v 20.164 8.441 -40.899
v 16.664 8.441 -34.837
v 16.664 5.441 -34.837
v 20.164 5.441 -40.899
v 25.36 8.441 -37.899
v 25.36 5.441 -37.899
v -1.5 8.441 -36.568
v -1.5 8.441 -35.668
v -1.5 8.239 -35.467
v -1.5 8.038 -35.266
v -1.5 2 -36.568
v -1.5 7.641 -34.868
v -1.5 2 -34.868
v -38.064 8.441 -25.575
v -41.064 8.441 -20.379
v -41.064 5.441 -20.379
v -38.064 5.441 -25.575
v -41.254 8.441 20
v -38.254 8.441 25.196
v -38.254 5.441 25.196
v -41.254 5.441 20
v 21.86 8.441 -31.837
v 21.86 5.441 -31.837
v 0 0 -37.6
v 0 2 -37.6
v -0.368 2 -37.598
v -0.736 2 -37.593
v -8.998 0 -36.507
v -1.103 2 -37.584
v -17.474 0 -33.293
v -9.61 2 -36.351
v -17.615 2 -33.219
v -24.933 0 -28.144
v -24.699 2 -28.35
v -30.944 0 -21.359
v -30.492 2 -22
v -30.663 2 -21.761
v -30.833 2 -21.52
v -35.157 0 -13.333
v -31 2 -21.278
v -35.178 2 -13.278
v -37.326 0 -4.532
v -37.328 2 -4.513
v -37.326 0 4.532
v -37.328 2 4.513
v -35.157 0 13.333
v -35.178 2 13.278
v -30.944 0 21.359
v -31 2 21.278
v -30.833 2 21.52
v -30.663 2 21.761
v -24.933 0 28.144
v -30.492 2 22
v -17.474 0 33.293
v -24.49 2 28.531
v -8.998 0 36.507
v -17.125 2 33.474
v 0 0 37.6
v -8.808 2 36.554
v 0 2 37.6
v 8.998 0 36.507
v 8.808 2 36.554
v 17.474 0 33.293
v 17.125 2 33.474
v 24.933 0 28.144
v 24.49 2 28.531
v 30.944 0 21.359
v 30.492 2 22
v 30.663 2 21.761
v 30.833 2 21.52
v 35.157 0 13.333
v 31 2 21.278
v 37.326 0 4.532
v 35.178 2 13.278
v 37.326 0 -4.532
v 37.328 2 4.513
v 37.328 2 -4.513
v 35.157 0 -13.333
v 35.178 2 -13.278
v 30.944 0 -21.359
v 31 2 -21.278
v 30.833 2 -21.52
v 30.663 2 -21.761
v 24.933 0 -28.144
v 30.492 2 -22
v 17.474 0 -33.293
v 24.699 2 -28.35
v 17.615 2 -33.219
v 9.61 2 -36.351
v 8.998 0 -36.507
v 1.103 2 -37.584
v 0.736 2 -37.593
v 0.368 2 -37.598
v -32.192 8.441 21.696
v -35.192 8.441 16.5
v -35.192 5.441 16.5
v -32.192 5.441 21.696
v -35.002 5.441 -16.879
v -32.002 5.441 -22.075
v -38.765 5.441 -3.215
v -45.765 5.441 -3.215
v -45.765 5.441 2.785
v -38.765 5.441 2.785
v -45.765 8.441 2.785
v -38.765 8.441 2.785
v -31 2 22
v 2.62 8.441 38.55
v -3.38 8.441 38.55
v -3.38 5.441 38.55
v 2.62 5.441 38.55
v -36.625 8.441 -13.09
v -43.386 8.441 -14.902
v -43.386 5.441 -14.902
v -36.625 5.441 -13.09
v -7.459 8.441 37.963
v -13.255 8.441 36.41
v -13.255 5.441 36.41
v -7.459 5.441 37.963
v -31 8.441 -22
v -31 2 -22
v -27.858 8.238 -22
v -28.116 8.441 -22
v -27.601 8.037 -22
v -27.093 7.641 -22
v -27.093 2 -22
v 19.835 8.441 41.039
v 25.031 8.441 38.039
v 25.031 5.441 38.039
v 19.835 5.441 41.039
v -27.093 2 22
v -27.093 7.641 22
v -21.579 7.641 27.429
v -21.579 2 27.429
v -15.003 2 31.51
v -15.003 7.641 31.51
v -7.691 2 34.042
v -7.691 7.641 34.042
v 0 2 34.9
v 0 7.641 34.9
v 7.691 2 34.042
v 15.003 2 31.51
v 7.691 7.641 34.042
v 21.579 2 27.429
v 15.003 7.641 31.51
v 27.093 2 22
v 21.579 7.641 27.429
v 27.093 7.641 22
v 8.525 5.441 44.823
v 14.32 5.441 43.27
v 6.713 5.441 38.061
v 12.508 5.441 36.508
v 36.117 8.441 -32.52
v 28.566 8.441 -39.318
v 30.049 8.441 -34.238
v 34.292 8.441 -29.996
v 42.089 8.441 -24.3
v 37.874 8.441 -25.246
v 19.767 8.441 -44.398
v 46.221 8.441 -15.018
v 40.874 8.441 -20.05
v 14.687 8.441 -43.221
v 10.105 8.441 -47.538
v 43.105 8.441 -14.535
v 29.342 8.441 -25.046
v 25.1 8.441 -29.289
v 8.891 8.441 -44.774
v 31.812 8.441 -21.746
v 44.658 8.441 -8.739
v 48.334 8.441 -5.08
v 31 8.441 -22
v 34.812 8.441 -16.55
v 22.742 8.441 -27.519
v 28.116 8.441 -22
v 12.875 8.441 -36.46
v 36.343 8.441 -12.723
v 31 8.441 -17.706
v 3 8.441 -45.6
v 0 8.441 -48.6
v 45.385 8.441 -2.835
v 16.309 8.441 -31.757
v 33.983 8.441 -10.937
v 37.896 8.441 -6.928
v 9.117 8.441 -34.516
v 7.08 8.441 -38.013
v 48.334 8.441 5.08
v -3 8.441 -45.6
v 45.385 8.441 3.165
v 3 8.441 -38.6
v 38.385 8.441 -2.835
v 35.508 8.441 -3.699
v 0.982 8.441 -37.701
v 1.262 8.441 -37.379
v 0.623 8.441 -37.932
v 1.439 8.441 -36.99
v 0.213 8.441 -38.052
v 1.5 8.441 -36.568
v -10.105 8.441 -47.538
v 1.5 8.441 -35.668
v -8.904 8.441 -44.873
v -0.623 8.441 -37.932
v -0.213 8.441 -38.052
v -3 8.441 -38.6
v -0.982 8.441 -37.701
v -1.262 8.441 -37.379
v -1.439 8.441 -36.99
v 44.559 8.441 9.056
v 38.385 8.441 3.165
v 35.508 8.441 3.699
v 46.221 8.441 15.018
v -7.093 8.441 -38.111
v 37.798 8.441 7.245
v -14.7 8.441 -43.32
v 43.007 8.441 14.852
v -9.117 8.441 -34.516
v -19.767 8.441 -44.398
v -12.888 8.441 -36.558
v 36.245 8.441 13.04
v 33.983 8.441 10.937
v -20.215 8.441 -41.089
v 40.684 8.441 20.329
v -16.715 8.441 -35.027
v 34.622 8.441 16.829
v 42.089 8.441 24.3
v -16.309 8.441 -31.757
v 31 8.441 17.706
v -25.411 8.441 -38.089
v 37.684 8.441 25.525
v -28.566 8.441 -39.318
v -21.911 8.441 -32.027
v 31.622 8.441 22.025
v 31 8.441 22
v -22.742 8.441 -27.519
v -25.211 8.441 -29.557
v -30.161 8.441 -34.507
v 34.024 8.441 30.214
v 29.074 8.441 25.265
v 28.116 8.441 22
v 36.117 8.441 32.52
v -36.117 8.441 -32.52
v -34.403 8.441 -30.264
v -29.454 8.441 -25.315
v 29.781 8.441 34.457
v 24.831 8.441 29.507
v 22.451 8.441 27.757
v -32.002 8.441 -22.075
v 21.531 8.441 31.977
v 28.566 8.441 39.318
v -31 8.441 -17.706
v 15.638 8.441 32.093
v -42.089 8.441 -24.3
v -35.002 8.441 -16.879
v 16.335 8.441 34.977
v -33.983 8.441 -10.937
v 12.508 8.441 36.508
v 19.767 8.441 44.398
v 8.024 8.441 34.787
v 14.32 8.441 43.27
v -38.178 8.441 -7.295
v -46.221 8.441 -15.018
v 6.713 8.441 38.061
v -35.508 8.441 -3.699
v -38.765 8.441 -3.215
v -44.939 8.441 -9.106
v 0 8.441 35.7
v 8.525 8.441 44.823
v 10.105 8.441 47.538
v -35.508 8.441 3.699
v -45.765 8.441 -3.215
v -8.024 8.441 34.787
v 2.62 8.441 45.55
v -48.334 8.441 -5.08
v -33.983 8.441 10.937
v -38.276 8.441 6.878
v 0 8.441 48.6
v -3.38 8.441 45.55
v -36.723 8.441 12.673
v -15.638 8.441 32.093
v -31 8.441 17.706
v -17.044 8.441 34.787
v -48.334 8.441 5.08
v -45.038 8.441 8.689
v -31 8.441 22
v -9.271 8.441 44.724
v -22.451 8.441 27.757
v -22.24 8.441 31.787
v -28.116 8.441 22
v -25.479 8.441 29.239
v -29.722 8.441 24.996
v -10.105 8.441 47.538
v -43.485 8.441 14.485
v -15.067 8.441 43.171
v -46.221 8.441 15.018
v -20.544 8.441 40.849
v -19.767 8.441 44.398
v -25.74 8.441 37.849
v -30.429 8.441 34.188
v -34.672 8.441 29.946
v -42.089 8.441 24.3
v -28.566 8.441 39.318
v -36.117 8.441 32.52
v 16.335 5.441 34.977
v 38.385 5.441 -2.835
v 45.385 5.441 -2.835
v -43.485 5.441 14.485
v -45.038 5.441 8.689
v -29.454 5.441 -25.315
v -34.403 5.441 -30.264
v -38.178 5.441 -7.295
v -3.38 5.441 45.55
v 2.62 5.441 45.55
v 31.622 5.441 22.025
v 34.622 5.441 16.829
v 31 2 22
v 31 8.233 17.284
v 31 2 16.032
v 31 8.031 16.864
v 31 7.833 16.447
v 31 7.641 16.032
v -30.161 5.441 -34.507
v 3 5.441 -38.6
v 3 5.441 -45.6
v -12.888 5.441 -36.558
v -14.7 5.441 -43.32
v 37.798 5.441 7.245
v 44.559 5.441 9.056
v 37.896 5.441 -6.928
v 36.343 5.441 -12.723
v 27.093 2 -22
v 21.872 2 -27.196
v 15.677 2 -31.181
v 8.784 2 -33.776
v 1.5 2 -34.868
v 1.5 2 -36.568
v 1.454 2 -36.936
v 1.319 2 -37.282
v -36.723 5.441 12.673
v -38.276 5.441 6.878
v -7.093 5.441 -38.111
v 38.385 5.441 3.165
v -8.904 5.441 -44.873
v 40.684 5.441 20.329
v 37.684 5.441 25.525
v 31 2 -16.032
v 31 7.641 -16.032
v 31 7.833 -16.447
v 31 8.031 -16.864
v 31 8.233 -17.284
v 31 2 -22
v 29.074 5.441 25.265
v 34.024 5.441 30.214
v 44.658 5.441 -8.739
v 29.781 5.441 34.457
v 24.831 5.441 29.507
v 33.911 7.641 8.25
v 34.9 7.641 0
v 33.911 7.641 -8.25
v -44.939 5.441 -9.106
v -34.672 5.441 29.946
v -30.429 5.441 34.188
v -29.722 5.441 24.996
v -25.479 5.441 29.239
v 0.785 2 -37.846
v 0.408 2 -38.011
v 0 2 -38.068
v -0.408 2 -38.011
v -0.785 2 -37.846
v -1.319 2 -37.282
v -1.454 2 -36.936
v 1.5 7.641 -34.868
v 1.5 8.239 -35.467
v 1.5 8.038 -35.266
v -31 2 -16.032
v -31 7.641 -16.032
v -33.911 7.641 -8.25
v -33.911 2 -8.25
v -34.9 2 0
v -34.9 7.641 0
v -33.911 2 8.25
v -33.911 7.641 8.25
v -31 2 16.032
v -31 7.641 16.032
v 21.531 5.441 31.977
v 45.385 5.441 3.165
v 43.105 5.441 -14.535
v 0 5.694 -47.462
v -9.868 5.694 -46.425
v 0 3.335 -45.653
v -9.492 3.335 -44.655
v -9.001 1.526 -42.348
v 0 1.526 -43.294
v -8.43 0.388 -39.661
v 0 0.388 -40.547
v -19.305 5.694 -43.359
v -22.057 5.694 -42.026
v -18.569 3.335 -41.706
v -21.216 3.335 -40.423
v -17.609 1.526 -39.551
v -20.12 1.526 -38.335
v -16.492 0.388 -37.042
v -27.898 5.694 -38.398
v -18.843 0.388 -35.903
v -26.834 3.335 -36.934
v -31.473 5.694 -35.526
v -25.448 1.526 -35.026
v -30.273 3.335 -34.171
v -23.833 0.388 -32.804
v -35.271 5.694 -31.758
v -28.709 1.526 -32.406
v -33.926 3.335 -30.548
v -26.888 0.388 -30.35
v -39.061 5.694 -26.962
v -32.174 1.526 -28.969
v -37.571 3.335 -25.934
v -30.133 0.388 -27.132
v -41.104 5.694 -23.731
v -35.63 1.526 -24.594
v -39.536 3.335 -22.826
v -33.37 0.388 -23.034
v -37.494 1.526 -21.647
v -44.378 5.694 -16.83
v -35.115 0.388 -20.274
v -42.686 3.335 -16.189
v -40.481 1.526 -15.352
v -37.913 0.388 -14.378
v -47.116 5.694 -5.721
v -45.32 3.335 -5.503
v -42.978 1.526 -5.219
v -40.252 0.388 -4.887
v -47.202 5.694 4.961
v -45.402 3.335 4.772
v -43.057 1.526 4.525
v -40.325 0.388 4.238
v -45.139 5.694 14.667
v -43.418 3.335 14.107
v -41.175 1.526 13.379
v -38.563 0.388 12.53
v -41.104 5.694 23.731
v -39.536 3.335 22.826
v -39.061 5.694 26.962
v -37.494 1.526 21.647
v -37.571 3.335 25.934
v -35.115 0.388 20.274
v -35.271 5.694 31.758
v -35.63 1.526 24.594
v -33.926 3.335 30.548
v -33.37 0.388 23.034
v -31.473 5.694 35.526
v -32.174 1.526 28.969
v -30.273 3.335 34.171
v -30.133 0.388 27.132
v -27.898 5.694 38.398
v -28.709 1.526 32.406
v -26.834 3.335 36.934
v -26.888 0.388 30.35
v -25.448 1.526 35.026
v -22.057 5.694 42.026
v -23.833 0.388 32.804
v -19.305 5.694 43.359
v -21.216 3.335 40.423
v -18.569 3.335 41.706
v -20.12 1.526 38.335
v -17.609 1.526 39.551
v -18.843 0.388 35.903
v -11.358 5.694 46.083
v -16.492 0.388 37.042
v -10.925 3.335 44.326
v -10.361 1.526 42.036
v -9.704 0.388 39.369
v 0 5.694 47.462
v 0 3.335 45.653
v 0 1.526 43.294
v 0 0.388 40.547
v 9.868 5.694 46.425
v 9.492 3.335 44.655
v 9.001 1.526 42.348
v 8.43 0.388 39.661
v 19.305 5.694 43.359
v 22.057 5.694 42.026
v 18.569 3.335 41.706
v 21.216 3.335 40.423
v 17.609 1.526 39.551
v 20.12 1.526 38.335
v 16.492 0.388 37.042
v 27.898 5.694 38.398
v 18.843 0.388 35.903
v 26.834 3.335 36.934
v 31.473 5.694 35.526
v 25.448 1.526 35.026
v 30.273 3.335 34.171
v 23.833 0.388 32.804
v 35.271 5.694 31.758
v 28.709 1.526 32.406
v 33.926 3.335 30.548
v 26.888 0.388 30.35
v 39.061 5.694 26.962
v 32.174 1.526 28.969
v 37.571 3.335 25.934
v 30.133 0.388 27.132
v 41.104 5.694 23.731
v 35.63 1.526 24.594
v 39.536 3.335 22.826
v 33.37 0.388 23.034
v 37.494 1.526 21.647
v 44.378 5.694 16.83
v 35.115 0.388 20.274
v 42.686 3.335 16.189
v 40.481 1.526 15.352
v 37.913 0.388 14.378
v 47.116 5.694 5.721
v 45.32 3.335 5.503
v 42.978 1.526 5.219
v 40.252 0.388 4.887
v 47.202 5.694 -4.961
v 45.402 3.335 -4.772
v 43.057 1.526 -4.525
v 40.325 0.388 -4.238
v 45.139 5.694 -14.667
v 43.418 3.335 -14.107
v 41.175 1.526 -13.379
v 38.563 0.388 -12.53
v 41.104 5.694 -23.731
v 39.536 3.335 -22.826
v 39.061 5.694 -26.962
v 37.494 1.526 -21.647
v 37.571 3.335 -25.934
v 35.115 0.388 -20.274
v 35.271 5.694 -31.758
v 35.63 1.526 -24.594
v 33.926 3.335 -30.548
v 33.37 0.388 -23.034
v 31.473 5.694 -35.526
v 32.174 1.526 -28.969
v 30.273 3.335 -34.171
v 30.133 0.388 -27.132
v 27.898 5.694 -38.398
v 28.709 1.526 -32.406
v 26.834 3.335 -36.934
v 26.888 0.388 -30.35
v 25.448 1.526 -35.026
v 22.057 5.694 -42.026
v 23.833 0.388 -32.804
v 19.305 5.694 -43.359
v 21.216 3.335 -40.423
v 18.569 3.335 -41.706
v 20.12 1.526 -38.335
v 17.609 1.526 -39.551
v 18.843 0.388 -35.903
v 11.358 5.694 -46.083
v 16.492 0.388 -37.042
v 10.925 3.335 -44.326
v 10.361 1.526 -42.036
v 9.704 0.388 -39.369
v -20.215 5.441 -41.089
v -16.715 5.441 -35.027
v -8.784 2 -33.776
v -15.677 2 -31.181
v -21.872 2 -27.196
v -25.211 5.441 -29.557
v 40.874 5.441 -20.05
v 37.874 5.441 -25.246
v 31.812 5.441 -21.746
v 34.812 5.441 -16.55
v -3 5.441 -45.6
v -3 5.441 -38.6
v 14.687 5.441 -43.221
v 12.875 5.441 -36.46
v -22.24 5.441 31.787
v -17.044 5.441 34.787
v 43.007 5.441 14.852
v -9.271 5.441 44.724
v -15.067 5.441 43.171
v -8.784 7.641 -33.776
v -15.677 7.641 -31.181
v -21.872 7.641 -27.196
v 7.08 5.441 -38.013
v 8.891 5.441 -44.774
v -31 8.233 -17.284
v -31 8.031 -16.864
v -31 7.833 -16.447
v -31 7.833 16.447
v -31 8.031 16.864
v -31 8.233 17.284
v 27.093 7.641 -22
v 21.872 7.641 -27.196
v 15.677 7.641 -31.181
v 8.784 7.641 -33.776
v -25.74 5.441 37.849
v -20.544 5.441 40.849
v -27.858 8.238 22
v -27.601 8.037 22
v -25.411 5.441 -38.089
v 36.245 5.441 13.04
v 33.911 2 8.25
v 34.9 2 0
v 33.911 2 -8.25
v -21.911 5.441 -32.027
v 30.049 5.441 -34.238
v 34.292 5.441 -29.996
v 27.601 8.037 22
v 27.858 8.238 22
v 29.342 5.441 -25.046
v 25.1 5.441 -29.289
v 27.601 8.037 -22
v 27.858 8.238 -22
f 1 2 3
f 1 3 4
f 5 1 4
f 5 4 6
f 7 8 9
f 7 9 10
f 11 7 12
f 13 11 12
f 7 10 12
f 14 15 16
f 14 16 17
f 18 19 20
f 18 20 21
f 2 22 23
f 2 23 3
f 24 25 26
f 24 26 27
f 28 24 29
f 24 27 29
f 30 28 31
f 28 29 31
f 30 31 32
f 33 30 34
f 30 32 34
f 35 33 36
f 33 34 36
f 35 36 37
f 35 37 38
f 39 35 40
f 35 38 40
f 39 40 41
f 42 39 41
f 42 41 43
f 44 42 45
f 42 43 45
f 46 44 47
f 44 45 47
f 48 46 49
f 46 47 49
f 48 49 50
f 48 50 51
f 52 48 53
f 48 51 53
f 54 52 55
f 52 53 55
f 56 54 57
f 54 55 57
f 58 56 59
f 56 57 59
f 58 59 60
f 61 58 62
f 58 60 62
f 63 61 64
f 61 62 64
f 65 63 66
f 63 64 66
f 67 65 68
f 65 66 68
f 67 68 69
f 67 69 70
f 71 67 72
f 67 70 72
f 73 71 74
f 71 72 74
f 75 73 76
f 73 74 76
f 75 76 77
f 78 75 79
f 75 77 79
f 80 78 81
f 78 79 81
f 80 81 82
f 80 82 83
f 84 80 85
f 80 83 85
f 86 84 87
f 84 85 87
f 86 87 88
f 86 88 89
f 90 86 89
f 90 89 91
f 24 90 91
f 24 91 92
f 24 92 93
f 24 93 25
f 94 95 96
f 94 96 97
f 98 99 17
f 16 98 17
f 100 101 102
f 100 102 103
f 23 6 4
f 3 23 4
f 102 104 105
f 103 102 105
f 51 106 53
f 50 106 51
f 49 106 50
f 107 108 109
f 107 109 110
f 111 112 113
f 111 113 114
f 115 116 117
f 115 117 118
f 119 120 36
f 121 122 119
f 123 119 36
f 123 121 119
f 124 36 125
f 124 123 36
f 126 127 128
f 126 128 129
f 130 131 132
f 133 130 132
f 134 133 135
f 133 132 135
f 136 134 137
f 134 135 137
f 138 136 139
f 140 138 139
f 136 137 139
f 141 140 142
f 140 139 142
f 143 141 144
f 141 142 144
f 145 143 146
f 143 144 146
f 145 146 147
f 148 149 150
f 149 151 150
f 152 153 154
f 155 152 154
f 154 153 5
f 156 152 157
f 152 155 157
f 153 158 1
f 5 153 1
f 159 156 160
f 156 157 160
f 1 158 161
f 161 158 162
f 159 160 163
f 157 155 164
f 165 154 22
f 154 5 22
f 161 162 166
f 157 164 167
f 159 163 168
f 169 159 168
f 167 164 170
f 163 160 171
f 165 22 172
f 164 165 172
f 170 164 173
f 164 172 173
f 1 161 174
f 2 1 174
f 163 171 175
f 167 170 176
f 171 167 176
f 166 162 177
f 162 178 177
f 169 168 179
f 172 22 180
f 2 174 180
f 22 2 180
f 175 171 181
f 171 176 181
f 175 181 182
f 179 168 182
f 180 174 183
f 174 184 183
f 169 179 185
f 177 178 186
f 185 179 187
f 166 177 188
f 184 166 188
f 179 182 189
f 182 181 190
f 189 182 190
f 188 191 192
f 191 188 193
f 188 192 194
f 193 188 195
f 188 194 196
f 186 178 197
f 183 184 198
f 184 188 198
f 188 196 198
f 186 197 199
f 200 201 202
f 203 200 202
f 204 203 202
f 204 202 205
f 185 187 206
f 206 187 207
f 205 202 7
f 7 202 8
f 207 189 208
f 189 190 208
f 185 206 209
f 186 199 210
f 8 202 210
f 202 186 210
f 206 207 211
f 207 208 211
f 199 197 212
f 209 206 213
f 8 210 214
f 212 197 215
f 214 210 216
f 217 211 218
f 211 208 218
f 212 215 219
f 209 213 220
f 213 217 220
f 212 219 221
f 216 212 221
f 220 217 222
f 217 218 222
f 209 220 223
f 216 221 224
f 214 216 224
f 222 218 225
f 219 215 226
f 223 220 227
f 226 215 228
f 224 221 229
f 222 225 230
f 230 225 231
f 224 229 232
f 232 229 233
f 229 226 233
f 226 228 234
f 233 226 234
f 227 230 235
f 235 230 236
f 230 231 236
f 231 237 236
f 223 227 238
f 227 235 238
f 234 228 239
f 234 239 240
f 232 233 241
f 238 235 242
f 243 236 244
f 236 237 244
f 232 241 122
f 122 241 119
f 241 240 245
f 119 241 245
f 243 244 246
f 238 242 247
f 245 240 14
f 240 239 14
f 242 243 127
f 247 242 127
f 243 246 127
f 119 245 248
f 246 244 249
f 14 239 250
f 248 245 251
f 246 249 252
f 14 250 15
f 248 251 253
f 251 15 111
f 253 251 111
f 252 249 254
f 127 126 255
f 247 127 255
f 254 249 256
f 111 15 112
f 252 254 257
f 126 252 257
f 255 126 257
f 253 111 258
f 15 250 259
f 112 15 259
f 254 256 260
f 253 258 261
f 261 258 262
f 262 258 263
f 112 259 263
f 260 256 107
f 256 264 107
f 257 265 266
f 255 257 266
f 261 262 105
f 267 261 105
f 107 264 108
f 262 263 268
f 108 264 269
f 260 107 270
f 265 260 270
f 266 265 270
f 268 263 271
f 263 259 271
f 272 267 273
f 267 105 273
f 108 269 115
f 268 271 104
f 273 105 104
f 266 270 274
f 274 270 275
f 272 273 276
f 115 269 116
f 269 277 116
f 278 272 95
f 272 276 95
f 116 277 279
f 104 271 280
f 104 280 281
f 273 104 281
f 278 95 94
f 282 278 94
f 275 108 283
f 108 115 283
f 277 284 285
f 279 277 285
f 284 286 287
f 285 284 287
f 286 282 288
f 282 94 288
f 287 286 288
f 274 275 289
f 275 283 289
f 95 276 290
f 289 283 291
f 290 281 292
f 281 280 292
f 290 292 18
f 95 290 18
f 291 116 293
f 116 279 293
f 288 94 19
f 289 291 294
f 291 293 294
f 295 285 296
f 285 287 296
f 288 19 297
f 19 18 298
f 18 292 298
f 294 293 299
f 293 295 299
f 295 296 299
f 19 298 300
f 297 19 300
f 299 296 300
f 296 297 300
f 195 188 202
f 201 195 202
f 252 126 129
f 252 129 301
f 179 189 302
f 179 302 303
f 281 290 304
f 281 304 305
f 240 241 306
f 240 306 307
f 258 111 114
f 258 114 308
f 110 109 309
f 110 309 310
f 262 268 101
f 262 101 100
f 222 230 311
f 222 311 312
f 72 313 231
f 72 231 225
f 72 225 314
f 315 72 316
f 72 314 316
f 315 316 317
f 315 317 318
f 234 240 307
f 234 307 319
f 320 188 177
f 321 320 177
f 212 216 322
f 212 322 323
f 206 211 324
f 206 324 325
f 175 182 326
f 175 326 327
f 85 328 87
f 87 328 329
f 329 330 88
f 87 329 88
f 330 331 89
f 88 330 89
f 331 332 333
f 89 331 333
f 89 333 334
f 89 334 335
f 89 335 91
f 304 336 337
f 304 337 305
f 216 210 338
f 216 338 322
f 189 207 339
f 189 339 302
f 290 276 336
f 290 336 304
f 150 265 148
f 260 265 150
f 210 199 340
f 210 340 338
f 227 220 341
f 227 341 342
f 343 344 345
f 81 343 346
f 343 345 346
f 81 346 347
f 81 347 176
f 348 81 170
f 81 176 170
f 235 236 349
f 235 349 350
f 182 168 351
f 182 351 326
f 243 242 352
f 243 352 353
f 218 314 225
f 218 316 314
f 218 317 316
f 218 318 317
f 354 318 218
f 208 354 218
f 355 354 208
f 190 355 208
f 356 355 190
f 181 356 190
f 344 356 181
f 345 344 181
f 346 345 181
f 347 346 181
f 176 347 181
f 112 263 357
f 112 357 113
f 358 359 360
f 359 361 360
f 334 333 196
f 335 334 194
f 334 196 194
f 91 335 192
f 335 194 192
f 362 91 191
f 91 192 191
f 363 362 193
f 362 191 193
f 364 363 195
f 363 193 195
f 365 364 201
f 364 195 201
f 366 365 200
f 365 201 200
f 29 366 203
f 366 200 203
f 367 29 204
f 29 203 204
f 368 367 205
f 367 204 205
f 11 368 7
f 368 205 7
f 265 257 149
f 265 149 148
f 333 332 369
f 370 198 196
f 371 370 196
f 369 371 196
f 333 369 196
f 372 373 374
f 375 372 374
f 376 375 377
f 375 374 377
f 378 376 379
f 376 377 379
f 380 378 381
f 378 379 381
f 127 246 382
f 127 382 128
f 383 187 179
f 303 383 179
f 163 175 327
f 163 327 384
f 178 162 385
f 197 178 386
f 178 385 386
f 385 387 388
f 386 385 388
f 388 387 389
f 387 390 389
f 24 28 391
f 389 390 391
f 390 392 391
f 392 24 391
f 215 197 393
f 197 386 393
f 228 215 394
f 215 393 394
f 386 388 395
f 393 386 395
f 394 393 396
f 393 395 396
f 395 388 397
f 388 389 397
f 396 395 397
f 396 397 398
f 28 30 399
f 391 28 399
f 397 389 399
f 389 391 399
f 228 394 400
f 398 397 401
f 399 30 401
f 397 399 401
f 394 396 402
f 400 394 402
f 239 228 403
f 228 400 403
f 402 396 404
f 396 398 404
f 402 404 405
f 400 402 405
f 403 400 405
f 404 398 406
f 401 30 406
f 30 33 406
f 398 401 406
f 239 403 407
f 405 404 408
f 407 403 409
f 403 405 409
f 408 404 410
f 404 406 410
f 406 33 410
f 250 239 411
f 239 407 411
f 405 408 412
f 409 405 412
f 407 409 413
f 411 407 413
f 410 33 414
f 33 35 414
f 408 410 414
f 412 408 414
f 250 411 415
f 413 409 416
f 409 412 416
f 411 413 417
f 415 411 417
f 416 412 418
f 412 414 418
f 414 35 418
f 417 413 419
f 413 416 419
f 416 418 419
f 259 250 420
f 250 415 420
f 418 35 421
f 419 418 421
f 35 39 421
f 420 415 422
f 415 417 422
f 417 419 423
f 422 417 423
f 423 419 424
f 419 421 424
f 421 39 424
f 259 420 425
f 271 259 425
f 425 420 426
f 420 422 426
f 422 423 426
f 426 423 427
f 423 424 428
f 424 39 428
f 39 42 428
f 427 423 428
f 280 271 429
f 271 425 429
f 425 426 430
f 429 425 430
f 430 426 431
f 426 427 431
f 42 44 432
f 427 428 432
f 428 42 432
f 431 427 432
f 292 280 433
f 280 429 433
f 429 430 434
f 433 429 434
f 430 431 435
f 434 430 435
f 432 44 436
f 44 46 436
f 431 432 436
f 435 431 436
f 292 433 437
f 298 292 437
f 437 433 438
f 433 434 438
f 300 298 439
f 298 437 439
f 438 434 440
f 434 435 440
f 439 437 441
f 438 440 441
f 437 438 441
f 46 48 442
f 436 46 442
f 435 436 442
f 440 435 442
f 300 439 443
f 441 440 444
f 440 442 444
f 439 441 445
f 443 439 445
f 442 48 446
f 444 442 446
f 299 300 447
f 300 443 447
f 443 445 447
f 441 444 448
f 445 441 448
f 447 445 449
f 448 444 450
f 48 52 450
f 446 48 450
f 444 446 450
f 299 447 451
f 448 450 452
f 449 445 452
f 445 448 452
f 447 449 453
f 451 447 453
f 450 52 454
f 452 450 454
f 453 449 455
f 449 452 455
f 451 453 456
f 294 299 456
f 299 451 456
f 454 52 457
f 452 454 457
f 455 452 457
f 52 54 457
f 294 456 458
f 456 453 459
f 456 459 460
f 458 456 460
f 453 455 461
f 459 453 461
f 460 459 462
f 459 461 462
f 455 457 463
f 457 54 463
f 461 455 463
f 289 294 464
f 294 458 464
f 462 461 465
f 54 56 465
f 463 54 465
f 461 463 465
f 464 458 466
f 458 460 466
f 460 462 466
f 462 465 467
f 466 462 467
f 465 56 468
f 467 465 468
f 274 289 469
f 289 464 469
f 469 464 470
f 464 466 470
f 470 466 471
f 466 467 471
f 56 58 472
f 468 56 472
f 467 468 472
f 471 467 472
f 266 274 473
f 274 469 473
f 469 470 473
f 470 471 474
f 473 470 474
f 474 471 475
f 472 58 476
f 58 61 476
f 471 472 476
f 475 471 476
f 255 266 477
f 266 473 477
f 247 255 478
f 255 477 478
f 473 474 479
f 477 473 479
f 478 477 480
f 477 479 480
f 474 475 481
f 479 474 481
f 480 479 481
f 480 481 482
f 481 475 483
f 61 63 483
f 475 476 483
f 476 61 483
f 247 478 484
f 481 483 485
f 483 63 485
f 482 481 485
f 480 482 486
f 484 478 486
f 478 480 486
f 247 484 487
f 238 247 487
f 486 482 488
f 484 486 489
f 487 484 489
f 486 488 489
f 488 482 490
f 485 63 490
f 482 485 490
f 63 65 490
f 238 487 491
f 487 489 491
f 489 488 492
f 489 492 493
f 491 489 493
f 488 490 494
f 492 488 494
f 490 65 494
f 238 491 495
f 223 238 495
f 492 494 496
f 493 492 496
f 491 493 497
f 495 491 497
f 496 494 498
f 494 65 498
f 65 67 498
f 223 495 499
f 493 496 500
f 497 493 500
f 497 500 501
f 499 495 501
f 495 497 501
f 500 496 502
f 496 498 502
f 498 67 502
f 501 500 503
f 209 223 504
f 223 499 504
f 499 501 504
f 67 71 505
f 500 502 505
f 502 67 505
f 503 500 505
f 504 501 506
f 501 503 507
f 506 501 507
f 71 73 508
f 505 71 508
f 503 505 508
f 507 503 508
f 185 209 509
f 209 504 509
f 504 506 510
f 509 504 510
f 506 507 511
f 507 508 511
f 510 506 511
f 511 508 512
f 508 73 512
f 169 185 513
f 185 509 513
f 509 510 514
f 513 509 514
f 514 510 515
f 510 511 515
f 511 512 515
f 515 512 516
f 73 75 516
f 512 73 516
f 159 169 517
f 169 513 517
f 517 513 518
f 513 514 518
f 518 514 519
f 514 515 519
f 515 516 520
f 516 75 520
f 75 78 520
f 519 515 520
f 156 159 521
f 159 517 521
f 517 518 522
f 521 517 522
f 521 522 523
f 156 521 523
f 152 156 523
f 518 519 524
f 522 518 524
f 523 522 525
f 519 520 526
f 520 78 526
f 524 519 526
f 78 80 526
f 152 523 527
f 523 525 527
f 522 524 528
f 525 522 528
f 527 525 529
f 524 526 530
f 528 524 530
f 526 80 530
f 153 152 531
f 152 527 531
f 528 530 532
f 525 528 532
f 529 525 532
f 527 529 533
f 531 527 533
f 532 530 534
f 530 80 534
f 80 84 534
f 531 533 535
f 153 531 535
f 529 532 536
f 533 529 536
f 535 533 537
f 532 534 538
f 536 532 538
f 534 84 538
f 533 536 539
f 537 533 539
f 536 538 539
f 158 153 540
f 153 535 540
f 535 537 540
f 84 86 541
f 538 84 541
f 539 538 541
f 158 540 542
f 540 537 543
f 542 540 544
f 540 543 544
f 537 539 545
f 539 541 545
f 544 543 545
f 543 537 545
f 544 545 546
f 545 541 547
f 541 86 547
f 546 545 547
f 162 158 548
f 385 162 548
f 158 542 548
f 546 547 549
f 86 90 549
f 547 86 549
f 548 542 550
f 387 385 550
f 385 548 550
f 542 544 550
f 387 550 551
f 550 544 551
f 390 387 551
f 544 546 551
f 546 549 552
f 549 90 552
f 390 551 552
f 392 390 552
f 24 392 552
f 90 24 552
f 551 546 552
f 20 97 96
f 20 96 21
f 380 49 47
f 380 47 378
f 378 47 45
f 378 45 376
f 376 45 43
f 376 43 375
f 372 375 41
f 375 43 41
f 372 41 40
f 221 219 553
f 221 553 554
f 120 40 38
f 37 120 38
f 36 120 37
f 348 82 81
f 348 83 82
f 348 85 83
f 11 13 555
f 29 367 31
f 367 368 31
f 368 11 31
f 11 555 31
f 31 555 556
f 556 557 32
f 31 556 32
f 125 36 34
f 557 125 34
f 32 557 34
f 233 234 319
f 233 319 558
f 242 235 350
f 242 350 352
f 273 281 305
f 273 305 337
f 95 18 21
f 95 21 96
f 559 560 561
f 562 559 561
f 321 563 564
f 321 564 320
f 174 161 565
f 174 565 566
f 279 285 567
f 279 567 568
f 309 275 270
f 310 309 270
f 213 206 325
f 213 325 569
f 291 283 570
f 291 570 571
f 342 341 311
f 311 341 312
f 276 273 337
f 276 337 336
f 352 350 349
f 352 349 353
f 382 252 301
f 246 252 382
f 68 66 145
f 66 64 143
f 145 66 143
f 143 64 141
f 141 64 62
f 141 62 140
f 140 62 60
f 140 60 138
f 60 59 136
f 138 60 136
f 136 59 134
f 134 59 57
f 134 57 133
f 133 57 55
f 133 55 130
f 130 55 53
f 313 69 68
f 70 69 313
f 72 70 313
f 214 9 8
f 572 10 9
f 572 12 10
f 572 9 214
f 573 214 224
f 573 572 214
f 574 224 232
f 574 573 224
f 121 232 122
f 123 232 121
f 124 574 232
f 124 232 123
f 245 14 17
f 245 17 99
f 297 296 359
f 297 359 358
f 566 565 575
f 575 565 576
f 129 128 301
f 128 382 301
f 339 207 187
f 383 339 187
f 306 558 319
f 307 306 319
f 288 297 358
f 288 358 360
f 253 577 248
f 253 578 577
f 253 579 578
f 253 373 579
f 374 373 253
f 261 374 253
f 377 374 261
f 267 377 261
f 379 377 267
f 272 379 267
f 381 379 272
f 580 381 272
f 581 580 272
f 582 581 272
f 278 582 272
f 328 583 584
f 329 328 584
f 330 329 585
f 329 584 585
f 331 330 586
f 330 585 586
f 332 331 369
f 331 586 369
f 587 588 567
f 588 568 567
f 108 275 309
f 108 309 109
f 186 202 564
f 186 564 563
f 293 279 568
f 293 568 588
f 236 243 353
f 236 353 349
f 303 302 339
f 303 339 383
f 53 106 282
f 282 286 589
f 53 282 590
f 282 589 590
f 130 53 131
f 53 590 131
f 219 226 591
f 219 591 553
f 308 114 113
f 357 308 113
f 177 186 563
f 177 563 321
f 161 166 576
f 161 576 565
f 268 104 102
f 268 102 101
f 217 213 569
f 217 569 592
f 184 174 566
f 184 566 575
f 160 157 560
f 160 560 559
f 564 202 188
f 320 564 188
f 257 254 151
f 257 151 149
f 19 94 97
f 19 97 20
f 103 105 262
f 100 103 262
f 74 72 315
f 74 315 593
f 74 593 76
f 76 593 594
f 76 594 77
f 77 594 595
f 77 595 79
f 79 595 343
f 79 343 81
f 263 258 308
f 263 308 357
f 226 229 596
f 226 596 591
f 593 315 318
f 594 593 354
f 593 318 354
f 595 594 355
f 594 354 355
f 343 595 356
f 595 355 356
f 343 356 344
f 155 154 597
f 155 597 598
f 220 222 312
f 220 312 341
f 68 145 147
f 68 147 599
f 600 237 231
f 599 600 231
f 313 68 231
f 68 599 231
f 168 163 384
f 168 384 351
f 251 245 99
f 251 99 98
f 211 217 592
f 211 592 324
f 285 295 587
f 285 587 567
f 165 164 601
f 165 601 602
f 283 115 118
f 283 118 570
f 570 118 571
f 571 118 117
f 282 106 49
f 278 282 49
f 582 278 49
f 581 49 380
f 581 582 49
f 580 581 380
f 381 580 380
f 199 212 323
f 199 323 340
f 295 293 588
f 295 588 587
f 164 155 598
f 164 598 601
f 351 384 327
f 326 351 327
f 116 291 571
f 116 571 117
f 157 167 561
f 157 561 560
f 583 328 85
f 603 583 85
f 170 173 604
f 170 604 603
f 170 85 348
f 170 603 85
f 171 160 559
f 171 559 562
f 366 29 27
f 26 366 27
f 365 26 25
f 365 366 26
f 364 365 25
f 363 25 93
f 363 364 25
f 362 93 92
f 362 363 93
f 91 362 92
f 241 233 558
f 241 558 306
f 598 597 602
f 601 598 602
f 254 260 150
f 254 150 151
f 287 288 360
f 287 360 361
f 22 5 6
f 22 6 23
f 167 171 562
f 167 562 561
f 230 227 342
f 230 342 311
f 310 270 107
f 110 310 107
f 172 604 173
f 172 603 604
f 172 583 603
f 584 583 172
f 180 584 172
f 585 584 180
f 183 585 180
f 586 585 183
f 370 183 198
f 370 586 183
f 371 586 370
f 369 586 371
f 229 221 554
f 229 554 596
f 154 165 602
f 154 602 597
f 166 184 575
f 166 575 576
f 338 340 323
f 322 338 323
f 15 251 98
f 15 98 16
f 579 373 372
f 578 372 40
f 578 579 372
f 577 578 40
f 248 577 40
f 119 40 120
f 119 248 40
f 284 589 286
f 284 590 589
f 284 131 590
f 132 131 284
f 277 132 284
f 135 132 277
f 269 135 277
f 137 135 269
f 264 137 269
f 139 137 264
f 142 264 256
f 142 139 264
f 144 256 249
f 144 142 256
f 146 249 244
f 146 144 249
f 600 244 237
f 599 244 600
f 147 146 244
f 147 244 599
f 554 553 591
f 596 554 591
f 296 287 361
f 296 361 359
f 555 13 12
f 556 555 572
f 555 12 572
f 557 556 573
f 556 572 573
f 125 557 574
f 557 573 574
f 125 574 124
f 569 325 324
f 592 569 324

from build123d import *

# Parameters (mm, degrees)
ESQUISSE2_W             = 62
ESQUISSE2_H             = 44
ENL_V_MAT_EXTRU_1_DEPTH = 6.440596868
ESQUISSE3_W             = 6
ESQUISSE3_H             = 7
ESQUISSE3_W_2           = 7
ESQUISSE3_H_2           = 6
ENL_V_MAT_EXTRU_2_DEPTH = 3
ENL_V_MAT_EXTRU_3_DEPTH = 6.440596868
CHANFREIN1_SIZE         = 0.8


with BuildPart() as part:
    # Esquisse1 → Révolution1 (revolve)
    with BuildSketch(Plane.XY, mode=Mode.PRIVATE) as r_volution1_sk:
        with BuildLine():
            Line((37.6, 0), (37.6, 2))
            Line((37.6, 2), (34.9, 2))
            Line((34.9, 2), (34.9, 8.440596868))
            Line((34.9, 8.440596868), (48.6, 8.440596868))
            ThreePointArc((48.6, 8.440596868), (44.532598277, 2.35330001), (37.6, 0))
        make_face()
    revolve(r_volution1_sk.sketch.rotate(Axis((0, 0, 0), (0, 1, 0)), 90), axis=Axis((0, 0, 0), (0, 1, 0)))

    # Esquisse2 → Enlèv. mat.-Extru.1 (cut)
    with BuildSketch(Plane(origin=(0, 8.440596868, 0), x_dir=(1, 0, 0), z_dir=(0, 1, 0))):
        Rectangle(ESQUISSE2_W, ESQUISSE2_H)
    extrude(amount=-ENL_V_MAT_EXTRU_1_DEPTH, mode=Mode.SUBTRACT)

    # Esquisse3 → Enlèv. mat.-Extru.2 (cut)
    with BuildSketch(Plane(origin=(0, 8.440596868, 0), x_dir=(1, 0, 0), z_dir=(0, 1, 0))):
        with Locations((0, 42.1)):
            Rectangle(ESQUISSE3_W, ESQUISSE3_H)
        Polygon((8.891430026, 44.774378523), (14.686984983, 43.221464252), (12.875251668, 36.459983468), (7.07969671, 38.012897739), align=None)
        Polygon((20.163982836, 40.899160851), (25.360135259, 37.899160851), (21.860135259, 31.836983025), (16.663982836, 34.836983025), align=None)
        Polygon((30.049452587, 34.238436665), (34.292093274, 29.995795978), (29.342345806, 25.04604851), (25.099705119, 29.288689197), align=None)
        Polygon((37.874160851, 25.246123311), (40.874160851, 20.049970888), (34.811983025, 16.549970888), (31.811983025, 21.746123311), align=None)
        Polygon((43.104866691, 14.535032083), (44.657780961, 8.739477125), (37.896300177, 6.927743809), (36.343385907, 12.723298767), align=None)
        with Locations((41.885106147, -0.164893853)):
            Rectangle(ESQUISSE3_W_2, ESQUISSE3_H_2)
        Polygon((44.55948467, -9.056323878), (43.006570399, -14.851878836), (36.245089615, -13.04014552), (37.798003886, -7.244590563), align=None)
        Polygon((40.684266998, -20.328876689), (37.684266998, -25.525029112), (31.622089172, -22.025029112), (34.622089172, -16.828876689), align=None)
        Polygon((34.023542812, -30.21434644), (29.780902125, -34.456987127), (24.831154657, -29.507239659), (29.073795344, -25.264598972), align=None)
        Polygon((25.031229458, -38.039054704), (19.835077035, -41.039054704), (16.335077035, -34.976876877), (21.531229458, -31.976876877), align=None)
        Polygon((14.32013823, -43.269760543), (8.524583272, -44.822674814), (6.712849956, -38.06119403), (12.508404914, -36.508279759), align=None)
        with Locations((-0.379787706, -42.05)):
            Rectangle(ESQUISSE3_W, ESQUISSE3_H)
        Polygon((-9.271217731, -44.724378523), (-15.066772689, -43.171464252), (-13.255039373, -36.409983468), (-7.459484415, -37.962897739), align=None)
        Polygon((-20.543770542, -40.849160851), (-25.739922965, -37.849160851), (-22.239922965, -31.786983025), (-17.043770542, -34.786983025), align=None)
        Polygon((-30.429240293, -34.188436665), (-34.67188098, -29.945795978), (-29.722133512, -24.99604851), (-25.479492825, -29.238689197), align=None)
        Polygon((-38.253948557, -25.196123311), (-41.253948557, -19.999970888), (-35.19177073, -16.499970888), (-32.19177073, -21.696123311), align=None)
        Polygon((-43.484654396, -14.485032083), (-45.037568667, -8.689477125), (-38.276087883, -6.877743809), (-36.723173612, -12.673298767), align=None)
        with Locations((-42.264893853, 0.214893853)):
            Rectangle(ESQUISSE3_W_2, ESQUISSE3_H_2)
        Polygon((-44.939272376, 9.106323878), (-43.386358105, 14.901878836), (-36.624877321, 13.09014552), (-38.177791592, 7.294590563), align=None)
        Polygon((-41.064054704, 20.378876689), (-38.064054704, 25.575029112), (-32.001876877, 22.075029112), (-35.001876877, 16.878876689), align=None)
        Polygon((-34.403330518, 30.26434644), (-30.160689831, 34.506987127), (-25.210942362, 29.557239659), (-29.45358305, 25.314598972), align=None)
        Polygon((-25.411017164, 38.089054704), (-20.214864741, 41.089054704), (-16.714864741, 35.026876877), (-21.911017164, 32.026876877), align=None)
        Polygon((-14.699925936, 43.319760543), (-8.904370978, 44.872674814), (-7.092637662, 38.11119403), (-12.88819262, 36.558279759), align=None)
    extrude(amount=-ENL_V_MAT_EXTRU_2_DEPTH, mode=Mode.SUBTRACT)

    # Esquisse4 → Enlèv. mat.-Extru.3 (cut)
    with BuildSketch(Plane(origin=(0, 8.440596868, 0), x_dir=(1, 0, 0), z_dir=(0, 1, 0))):
        with BuildLine():
            Line((-1.5, 36.567750143), (-1.5, 34.867750143))
            Line((-1.5, 34.867750143), (1.5, 34.867750143))
            Line((1.5, 34.867750143), (1.5, 36.567750143))
            ThreePointArc((1.5, 36.567750143), (0, 38.067750143), (-1.5, 36.567750143))
        make_face()
    extrude(amount=-ENL_V_MAT_EXTRU_3_DEPTH, mode=Mode.SUBTRACT)

    # Chanfrein1
    chanfrein1_edges = [part.edges().sort_by_distance(p)[0] for p in [
        (34.9, 8.440596868, 0),
        (0, 8.440596868, 34.9),
        (-34.9, 8.440596868, 0),
        (-15.677347117, 8.440596868, -31.180615571),
        (15.677347117, 8.440596868, -31.180615571),
    ]]
    chamfer(chanfrein1_edges, length=CHANFREIN1_SIZE)


solid = part.part
